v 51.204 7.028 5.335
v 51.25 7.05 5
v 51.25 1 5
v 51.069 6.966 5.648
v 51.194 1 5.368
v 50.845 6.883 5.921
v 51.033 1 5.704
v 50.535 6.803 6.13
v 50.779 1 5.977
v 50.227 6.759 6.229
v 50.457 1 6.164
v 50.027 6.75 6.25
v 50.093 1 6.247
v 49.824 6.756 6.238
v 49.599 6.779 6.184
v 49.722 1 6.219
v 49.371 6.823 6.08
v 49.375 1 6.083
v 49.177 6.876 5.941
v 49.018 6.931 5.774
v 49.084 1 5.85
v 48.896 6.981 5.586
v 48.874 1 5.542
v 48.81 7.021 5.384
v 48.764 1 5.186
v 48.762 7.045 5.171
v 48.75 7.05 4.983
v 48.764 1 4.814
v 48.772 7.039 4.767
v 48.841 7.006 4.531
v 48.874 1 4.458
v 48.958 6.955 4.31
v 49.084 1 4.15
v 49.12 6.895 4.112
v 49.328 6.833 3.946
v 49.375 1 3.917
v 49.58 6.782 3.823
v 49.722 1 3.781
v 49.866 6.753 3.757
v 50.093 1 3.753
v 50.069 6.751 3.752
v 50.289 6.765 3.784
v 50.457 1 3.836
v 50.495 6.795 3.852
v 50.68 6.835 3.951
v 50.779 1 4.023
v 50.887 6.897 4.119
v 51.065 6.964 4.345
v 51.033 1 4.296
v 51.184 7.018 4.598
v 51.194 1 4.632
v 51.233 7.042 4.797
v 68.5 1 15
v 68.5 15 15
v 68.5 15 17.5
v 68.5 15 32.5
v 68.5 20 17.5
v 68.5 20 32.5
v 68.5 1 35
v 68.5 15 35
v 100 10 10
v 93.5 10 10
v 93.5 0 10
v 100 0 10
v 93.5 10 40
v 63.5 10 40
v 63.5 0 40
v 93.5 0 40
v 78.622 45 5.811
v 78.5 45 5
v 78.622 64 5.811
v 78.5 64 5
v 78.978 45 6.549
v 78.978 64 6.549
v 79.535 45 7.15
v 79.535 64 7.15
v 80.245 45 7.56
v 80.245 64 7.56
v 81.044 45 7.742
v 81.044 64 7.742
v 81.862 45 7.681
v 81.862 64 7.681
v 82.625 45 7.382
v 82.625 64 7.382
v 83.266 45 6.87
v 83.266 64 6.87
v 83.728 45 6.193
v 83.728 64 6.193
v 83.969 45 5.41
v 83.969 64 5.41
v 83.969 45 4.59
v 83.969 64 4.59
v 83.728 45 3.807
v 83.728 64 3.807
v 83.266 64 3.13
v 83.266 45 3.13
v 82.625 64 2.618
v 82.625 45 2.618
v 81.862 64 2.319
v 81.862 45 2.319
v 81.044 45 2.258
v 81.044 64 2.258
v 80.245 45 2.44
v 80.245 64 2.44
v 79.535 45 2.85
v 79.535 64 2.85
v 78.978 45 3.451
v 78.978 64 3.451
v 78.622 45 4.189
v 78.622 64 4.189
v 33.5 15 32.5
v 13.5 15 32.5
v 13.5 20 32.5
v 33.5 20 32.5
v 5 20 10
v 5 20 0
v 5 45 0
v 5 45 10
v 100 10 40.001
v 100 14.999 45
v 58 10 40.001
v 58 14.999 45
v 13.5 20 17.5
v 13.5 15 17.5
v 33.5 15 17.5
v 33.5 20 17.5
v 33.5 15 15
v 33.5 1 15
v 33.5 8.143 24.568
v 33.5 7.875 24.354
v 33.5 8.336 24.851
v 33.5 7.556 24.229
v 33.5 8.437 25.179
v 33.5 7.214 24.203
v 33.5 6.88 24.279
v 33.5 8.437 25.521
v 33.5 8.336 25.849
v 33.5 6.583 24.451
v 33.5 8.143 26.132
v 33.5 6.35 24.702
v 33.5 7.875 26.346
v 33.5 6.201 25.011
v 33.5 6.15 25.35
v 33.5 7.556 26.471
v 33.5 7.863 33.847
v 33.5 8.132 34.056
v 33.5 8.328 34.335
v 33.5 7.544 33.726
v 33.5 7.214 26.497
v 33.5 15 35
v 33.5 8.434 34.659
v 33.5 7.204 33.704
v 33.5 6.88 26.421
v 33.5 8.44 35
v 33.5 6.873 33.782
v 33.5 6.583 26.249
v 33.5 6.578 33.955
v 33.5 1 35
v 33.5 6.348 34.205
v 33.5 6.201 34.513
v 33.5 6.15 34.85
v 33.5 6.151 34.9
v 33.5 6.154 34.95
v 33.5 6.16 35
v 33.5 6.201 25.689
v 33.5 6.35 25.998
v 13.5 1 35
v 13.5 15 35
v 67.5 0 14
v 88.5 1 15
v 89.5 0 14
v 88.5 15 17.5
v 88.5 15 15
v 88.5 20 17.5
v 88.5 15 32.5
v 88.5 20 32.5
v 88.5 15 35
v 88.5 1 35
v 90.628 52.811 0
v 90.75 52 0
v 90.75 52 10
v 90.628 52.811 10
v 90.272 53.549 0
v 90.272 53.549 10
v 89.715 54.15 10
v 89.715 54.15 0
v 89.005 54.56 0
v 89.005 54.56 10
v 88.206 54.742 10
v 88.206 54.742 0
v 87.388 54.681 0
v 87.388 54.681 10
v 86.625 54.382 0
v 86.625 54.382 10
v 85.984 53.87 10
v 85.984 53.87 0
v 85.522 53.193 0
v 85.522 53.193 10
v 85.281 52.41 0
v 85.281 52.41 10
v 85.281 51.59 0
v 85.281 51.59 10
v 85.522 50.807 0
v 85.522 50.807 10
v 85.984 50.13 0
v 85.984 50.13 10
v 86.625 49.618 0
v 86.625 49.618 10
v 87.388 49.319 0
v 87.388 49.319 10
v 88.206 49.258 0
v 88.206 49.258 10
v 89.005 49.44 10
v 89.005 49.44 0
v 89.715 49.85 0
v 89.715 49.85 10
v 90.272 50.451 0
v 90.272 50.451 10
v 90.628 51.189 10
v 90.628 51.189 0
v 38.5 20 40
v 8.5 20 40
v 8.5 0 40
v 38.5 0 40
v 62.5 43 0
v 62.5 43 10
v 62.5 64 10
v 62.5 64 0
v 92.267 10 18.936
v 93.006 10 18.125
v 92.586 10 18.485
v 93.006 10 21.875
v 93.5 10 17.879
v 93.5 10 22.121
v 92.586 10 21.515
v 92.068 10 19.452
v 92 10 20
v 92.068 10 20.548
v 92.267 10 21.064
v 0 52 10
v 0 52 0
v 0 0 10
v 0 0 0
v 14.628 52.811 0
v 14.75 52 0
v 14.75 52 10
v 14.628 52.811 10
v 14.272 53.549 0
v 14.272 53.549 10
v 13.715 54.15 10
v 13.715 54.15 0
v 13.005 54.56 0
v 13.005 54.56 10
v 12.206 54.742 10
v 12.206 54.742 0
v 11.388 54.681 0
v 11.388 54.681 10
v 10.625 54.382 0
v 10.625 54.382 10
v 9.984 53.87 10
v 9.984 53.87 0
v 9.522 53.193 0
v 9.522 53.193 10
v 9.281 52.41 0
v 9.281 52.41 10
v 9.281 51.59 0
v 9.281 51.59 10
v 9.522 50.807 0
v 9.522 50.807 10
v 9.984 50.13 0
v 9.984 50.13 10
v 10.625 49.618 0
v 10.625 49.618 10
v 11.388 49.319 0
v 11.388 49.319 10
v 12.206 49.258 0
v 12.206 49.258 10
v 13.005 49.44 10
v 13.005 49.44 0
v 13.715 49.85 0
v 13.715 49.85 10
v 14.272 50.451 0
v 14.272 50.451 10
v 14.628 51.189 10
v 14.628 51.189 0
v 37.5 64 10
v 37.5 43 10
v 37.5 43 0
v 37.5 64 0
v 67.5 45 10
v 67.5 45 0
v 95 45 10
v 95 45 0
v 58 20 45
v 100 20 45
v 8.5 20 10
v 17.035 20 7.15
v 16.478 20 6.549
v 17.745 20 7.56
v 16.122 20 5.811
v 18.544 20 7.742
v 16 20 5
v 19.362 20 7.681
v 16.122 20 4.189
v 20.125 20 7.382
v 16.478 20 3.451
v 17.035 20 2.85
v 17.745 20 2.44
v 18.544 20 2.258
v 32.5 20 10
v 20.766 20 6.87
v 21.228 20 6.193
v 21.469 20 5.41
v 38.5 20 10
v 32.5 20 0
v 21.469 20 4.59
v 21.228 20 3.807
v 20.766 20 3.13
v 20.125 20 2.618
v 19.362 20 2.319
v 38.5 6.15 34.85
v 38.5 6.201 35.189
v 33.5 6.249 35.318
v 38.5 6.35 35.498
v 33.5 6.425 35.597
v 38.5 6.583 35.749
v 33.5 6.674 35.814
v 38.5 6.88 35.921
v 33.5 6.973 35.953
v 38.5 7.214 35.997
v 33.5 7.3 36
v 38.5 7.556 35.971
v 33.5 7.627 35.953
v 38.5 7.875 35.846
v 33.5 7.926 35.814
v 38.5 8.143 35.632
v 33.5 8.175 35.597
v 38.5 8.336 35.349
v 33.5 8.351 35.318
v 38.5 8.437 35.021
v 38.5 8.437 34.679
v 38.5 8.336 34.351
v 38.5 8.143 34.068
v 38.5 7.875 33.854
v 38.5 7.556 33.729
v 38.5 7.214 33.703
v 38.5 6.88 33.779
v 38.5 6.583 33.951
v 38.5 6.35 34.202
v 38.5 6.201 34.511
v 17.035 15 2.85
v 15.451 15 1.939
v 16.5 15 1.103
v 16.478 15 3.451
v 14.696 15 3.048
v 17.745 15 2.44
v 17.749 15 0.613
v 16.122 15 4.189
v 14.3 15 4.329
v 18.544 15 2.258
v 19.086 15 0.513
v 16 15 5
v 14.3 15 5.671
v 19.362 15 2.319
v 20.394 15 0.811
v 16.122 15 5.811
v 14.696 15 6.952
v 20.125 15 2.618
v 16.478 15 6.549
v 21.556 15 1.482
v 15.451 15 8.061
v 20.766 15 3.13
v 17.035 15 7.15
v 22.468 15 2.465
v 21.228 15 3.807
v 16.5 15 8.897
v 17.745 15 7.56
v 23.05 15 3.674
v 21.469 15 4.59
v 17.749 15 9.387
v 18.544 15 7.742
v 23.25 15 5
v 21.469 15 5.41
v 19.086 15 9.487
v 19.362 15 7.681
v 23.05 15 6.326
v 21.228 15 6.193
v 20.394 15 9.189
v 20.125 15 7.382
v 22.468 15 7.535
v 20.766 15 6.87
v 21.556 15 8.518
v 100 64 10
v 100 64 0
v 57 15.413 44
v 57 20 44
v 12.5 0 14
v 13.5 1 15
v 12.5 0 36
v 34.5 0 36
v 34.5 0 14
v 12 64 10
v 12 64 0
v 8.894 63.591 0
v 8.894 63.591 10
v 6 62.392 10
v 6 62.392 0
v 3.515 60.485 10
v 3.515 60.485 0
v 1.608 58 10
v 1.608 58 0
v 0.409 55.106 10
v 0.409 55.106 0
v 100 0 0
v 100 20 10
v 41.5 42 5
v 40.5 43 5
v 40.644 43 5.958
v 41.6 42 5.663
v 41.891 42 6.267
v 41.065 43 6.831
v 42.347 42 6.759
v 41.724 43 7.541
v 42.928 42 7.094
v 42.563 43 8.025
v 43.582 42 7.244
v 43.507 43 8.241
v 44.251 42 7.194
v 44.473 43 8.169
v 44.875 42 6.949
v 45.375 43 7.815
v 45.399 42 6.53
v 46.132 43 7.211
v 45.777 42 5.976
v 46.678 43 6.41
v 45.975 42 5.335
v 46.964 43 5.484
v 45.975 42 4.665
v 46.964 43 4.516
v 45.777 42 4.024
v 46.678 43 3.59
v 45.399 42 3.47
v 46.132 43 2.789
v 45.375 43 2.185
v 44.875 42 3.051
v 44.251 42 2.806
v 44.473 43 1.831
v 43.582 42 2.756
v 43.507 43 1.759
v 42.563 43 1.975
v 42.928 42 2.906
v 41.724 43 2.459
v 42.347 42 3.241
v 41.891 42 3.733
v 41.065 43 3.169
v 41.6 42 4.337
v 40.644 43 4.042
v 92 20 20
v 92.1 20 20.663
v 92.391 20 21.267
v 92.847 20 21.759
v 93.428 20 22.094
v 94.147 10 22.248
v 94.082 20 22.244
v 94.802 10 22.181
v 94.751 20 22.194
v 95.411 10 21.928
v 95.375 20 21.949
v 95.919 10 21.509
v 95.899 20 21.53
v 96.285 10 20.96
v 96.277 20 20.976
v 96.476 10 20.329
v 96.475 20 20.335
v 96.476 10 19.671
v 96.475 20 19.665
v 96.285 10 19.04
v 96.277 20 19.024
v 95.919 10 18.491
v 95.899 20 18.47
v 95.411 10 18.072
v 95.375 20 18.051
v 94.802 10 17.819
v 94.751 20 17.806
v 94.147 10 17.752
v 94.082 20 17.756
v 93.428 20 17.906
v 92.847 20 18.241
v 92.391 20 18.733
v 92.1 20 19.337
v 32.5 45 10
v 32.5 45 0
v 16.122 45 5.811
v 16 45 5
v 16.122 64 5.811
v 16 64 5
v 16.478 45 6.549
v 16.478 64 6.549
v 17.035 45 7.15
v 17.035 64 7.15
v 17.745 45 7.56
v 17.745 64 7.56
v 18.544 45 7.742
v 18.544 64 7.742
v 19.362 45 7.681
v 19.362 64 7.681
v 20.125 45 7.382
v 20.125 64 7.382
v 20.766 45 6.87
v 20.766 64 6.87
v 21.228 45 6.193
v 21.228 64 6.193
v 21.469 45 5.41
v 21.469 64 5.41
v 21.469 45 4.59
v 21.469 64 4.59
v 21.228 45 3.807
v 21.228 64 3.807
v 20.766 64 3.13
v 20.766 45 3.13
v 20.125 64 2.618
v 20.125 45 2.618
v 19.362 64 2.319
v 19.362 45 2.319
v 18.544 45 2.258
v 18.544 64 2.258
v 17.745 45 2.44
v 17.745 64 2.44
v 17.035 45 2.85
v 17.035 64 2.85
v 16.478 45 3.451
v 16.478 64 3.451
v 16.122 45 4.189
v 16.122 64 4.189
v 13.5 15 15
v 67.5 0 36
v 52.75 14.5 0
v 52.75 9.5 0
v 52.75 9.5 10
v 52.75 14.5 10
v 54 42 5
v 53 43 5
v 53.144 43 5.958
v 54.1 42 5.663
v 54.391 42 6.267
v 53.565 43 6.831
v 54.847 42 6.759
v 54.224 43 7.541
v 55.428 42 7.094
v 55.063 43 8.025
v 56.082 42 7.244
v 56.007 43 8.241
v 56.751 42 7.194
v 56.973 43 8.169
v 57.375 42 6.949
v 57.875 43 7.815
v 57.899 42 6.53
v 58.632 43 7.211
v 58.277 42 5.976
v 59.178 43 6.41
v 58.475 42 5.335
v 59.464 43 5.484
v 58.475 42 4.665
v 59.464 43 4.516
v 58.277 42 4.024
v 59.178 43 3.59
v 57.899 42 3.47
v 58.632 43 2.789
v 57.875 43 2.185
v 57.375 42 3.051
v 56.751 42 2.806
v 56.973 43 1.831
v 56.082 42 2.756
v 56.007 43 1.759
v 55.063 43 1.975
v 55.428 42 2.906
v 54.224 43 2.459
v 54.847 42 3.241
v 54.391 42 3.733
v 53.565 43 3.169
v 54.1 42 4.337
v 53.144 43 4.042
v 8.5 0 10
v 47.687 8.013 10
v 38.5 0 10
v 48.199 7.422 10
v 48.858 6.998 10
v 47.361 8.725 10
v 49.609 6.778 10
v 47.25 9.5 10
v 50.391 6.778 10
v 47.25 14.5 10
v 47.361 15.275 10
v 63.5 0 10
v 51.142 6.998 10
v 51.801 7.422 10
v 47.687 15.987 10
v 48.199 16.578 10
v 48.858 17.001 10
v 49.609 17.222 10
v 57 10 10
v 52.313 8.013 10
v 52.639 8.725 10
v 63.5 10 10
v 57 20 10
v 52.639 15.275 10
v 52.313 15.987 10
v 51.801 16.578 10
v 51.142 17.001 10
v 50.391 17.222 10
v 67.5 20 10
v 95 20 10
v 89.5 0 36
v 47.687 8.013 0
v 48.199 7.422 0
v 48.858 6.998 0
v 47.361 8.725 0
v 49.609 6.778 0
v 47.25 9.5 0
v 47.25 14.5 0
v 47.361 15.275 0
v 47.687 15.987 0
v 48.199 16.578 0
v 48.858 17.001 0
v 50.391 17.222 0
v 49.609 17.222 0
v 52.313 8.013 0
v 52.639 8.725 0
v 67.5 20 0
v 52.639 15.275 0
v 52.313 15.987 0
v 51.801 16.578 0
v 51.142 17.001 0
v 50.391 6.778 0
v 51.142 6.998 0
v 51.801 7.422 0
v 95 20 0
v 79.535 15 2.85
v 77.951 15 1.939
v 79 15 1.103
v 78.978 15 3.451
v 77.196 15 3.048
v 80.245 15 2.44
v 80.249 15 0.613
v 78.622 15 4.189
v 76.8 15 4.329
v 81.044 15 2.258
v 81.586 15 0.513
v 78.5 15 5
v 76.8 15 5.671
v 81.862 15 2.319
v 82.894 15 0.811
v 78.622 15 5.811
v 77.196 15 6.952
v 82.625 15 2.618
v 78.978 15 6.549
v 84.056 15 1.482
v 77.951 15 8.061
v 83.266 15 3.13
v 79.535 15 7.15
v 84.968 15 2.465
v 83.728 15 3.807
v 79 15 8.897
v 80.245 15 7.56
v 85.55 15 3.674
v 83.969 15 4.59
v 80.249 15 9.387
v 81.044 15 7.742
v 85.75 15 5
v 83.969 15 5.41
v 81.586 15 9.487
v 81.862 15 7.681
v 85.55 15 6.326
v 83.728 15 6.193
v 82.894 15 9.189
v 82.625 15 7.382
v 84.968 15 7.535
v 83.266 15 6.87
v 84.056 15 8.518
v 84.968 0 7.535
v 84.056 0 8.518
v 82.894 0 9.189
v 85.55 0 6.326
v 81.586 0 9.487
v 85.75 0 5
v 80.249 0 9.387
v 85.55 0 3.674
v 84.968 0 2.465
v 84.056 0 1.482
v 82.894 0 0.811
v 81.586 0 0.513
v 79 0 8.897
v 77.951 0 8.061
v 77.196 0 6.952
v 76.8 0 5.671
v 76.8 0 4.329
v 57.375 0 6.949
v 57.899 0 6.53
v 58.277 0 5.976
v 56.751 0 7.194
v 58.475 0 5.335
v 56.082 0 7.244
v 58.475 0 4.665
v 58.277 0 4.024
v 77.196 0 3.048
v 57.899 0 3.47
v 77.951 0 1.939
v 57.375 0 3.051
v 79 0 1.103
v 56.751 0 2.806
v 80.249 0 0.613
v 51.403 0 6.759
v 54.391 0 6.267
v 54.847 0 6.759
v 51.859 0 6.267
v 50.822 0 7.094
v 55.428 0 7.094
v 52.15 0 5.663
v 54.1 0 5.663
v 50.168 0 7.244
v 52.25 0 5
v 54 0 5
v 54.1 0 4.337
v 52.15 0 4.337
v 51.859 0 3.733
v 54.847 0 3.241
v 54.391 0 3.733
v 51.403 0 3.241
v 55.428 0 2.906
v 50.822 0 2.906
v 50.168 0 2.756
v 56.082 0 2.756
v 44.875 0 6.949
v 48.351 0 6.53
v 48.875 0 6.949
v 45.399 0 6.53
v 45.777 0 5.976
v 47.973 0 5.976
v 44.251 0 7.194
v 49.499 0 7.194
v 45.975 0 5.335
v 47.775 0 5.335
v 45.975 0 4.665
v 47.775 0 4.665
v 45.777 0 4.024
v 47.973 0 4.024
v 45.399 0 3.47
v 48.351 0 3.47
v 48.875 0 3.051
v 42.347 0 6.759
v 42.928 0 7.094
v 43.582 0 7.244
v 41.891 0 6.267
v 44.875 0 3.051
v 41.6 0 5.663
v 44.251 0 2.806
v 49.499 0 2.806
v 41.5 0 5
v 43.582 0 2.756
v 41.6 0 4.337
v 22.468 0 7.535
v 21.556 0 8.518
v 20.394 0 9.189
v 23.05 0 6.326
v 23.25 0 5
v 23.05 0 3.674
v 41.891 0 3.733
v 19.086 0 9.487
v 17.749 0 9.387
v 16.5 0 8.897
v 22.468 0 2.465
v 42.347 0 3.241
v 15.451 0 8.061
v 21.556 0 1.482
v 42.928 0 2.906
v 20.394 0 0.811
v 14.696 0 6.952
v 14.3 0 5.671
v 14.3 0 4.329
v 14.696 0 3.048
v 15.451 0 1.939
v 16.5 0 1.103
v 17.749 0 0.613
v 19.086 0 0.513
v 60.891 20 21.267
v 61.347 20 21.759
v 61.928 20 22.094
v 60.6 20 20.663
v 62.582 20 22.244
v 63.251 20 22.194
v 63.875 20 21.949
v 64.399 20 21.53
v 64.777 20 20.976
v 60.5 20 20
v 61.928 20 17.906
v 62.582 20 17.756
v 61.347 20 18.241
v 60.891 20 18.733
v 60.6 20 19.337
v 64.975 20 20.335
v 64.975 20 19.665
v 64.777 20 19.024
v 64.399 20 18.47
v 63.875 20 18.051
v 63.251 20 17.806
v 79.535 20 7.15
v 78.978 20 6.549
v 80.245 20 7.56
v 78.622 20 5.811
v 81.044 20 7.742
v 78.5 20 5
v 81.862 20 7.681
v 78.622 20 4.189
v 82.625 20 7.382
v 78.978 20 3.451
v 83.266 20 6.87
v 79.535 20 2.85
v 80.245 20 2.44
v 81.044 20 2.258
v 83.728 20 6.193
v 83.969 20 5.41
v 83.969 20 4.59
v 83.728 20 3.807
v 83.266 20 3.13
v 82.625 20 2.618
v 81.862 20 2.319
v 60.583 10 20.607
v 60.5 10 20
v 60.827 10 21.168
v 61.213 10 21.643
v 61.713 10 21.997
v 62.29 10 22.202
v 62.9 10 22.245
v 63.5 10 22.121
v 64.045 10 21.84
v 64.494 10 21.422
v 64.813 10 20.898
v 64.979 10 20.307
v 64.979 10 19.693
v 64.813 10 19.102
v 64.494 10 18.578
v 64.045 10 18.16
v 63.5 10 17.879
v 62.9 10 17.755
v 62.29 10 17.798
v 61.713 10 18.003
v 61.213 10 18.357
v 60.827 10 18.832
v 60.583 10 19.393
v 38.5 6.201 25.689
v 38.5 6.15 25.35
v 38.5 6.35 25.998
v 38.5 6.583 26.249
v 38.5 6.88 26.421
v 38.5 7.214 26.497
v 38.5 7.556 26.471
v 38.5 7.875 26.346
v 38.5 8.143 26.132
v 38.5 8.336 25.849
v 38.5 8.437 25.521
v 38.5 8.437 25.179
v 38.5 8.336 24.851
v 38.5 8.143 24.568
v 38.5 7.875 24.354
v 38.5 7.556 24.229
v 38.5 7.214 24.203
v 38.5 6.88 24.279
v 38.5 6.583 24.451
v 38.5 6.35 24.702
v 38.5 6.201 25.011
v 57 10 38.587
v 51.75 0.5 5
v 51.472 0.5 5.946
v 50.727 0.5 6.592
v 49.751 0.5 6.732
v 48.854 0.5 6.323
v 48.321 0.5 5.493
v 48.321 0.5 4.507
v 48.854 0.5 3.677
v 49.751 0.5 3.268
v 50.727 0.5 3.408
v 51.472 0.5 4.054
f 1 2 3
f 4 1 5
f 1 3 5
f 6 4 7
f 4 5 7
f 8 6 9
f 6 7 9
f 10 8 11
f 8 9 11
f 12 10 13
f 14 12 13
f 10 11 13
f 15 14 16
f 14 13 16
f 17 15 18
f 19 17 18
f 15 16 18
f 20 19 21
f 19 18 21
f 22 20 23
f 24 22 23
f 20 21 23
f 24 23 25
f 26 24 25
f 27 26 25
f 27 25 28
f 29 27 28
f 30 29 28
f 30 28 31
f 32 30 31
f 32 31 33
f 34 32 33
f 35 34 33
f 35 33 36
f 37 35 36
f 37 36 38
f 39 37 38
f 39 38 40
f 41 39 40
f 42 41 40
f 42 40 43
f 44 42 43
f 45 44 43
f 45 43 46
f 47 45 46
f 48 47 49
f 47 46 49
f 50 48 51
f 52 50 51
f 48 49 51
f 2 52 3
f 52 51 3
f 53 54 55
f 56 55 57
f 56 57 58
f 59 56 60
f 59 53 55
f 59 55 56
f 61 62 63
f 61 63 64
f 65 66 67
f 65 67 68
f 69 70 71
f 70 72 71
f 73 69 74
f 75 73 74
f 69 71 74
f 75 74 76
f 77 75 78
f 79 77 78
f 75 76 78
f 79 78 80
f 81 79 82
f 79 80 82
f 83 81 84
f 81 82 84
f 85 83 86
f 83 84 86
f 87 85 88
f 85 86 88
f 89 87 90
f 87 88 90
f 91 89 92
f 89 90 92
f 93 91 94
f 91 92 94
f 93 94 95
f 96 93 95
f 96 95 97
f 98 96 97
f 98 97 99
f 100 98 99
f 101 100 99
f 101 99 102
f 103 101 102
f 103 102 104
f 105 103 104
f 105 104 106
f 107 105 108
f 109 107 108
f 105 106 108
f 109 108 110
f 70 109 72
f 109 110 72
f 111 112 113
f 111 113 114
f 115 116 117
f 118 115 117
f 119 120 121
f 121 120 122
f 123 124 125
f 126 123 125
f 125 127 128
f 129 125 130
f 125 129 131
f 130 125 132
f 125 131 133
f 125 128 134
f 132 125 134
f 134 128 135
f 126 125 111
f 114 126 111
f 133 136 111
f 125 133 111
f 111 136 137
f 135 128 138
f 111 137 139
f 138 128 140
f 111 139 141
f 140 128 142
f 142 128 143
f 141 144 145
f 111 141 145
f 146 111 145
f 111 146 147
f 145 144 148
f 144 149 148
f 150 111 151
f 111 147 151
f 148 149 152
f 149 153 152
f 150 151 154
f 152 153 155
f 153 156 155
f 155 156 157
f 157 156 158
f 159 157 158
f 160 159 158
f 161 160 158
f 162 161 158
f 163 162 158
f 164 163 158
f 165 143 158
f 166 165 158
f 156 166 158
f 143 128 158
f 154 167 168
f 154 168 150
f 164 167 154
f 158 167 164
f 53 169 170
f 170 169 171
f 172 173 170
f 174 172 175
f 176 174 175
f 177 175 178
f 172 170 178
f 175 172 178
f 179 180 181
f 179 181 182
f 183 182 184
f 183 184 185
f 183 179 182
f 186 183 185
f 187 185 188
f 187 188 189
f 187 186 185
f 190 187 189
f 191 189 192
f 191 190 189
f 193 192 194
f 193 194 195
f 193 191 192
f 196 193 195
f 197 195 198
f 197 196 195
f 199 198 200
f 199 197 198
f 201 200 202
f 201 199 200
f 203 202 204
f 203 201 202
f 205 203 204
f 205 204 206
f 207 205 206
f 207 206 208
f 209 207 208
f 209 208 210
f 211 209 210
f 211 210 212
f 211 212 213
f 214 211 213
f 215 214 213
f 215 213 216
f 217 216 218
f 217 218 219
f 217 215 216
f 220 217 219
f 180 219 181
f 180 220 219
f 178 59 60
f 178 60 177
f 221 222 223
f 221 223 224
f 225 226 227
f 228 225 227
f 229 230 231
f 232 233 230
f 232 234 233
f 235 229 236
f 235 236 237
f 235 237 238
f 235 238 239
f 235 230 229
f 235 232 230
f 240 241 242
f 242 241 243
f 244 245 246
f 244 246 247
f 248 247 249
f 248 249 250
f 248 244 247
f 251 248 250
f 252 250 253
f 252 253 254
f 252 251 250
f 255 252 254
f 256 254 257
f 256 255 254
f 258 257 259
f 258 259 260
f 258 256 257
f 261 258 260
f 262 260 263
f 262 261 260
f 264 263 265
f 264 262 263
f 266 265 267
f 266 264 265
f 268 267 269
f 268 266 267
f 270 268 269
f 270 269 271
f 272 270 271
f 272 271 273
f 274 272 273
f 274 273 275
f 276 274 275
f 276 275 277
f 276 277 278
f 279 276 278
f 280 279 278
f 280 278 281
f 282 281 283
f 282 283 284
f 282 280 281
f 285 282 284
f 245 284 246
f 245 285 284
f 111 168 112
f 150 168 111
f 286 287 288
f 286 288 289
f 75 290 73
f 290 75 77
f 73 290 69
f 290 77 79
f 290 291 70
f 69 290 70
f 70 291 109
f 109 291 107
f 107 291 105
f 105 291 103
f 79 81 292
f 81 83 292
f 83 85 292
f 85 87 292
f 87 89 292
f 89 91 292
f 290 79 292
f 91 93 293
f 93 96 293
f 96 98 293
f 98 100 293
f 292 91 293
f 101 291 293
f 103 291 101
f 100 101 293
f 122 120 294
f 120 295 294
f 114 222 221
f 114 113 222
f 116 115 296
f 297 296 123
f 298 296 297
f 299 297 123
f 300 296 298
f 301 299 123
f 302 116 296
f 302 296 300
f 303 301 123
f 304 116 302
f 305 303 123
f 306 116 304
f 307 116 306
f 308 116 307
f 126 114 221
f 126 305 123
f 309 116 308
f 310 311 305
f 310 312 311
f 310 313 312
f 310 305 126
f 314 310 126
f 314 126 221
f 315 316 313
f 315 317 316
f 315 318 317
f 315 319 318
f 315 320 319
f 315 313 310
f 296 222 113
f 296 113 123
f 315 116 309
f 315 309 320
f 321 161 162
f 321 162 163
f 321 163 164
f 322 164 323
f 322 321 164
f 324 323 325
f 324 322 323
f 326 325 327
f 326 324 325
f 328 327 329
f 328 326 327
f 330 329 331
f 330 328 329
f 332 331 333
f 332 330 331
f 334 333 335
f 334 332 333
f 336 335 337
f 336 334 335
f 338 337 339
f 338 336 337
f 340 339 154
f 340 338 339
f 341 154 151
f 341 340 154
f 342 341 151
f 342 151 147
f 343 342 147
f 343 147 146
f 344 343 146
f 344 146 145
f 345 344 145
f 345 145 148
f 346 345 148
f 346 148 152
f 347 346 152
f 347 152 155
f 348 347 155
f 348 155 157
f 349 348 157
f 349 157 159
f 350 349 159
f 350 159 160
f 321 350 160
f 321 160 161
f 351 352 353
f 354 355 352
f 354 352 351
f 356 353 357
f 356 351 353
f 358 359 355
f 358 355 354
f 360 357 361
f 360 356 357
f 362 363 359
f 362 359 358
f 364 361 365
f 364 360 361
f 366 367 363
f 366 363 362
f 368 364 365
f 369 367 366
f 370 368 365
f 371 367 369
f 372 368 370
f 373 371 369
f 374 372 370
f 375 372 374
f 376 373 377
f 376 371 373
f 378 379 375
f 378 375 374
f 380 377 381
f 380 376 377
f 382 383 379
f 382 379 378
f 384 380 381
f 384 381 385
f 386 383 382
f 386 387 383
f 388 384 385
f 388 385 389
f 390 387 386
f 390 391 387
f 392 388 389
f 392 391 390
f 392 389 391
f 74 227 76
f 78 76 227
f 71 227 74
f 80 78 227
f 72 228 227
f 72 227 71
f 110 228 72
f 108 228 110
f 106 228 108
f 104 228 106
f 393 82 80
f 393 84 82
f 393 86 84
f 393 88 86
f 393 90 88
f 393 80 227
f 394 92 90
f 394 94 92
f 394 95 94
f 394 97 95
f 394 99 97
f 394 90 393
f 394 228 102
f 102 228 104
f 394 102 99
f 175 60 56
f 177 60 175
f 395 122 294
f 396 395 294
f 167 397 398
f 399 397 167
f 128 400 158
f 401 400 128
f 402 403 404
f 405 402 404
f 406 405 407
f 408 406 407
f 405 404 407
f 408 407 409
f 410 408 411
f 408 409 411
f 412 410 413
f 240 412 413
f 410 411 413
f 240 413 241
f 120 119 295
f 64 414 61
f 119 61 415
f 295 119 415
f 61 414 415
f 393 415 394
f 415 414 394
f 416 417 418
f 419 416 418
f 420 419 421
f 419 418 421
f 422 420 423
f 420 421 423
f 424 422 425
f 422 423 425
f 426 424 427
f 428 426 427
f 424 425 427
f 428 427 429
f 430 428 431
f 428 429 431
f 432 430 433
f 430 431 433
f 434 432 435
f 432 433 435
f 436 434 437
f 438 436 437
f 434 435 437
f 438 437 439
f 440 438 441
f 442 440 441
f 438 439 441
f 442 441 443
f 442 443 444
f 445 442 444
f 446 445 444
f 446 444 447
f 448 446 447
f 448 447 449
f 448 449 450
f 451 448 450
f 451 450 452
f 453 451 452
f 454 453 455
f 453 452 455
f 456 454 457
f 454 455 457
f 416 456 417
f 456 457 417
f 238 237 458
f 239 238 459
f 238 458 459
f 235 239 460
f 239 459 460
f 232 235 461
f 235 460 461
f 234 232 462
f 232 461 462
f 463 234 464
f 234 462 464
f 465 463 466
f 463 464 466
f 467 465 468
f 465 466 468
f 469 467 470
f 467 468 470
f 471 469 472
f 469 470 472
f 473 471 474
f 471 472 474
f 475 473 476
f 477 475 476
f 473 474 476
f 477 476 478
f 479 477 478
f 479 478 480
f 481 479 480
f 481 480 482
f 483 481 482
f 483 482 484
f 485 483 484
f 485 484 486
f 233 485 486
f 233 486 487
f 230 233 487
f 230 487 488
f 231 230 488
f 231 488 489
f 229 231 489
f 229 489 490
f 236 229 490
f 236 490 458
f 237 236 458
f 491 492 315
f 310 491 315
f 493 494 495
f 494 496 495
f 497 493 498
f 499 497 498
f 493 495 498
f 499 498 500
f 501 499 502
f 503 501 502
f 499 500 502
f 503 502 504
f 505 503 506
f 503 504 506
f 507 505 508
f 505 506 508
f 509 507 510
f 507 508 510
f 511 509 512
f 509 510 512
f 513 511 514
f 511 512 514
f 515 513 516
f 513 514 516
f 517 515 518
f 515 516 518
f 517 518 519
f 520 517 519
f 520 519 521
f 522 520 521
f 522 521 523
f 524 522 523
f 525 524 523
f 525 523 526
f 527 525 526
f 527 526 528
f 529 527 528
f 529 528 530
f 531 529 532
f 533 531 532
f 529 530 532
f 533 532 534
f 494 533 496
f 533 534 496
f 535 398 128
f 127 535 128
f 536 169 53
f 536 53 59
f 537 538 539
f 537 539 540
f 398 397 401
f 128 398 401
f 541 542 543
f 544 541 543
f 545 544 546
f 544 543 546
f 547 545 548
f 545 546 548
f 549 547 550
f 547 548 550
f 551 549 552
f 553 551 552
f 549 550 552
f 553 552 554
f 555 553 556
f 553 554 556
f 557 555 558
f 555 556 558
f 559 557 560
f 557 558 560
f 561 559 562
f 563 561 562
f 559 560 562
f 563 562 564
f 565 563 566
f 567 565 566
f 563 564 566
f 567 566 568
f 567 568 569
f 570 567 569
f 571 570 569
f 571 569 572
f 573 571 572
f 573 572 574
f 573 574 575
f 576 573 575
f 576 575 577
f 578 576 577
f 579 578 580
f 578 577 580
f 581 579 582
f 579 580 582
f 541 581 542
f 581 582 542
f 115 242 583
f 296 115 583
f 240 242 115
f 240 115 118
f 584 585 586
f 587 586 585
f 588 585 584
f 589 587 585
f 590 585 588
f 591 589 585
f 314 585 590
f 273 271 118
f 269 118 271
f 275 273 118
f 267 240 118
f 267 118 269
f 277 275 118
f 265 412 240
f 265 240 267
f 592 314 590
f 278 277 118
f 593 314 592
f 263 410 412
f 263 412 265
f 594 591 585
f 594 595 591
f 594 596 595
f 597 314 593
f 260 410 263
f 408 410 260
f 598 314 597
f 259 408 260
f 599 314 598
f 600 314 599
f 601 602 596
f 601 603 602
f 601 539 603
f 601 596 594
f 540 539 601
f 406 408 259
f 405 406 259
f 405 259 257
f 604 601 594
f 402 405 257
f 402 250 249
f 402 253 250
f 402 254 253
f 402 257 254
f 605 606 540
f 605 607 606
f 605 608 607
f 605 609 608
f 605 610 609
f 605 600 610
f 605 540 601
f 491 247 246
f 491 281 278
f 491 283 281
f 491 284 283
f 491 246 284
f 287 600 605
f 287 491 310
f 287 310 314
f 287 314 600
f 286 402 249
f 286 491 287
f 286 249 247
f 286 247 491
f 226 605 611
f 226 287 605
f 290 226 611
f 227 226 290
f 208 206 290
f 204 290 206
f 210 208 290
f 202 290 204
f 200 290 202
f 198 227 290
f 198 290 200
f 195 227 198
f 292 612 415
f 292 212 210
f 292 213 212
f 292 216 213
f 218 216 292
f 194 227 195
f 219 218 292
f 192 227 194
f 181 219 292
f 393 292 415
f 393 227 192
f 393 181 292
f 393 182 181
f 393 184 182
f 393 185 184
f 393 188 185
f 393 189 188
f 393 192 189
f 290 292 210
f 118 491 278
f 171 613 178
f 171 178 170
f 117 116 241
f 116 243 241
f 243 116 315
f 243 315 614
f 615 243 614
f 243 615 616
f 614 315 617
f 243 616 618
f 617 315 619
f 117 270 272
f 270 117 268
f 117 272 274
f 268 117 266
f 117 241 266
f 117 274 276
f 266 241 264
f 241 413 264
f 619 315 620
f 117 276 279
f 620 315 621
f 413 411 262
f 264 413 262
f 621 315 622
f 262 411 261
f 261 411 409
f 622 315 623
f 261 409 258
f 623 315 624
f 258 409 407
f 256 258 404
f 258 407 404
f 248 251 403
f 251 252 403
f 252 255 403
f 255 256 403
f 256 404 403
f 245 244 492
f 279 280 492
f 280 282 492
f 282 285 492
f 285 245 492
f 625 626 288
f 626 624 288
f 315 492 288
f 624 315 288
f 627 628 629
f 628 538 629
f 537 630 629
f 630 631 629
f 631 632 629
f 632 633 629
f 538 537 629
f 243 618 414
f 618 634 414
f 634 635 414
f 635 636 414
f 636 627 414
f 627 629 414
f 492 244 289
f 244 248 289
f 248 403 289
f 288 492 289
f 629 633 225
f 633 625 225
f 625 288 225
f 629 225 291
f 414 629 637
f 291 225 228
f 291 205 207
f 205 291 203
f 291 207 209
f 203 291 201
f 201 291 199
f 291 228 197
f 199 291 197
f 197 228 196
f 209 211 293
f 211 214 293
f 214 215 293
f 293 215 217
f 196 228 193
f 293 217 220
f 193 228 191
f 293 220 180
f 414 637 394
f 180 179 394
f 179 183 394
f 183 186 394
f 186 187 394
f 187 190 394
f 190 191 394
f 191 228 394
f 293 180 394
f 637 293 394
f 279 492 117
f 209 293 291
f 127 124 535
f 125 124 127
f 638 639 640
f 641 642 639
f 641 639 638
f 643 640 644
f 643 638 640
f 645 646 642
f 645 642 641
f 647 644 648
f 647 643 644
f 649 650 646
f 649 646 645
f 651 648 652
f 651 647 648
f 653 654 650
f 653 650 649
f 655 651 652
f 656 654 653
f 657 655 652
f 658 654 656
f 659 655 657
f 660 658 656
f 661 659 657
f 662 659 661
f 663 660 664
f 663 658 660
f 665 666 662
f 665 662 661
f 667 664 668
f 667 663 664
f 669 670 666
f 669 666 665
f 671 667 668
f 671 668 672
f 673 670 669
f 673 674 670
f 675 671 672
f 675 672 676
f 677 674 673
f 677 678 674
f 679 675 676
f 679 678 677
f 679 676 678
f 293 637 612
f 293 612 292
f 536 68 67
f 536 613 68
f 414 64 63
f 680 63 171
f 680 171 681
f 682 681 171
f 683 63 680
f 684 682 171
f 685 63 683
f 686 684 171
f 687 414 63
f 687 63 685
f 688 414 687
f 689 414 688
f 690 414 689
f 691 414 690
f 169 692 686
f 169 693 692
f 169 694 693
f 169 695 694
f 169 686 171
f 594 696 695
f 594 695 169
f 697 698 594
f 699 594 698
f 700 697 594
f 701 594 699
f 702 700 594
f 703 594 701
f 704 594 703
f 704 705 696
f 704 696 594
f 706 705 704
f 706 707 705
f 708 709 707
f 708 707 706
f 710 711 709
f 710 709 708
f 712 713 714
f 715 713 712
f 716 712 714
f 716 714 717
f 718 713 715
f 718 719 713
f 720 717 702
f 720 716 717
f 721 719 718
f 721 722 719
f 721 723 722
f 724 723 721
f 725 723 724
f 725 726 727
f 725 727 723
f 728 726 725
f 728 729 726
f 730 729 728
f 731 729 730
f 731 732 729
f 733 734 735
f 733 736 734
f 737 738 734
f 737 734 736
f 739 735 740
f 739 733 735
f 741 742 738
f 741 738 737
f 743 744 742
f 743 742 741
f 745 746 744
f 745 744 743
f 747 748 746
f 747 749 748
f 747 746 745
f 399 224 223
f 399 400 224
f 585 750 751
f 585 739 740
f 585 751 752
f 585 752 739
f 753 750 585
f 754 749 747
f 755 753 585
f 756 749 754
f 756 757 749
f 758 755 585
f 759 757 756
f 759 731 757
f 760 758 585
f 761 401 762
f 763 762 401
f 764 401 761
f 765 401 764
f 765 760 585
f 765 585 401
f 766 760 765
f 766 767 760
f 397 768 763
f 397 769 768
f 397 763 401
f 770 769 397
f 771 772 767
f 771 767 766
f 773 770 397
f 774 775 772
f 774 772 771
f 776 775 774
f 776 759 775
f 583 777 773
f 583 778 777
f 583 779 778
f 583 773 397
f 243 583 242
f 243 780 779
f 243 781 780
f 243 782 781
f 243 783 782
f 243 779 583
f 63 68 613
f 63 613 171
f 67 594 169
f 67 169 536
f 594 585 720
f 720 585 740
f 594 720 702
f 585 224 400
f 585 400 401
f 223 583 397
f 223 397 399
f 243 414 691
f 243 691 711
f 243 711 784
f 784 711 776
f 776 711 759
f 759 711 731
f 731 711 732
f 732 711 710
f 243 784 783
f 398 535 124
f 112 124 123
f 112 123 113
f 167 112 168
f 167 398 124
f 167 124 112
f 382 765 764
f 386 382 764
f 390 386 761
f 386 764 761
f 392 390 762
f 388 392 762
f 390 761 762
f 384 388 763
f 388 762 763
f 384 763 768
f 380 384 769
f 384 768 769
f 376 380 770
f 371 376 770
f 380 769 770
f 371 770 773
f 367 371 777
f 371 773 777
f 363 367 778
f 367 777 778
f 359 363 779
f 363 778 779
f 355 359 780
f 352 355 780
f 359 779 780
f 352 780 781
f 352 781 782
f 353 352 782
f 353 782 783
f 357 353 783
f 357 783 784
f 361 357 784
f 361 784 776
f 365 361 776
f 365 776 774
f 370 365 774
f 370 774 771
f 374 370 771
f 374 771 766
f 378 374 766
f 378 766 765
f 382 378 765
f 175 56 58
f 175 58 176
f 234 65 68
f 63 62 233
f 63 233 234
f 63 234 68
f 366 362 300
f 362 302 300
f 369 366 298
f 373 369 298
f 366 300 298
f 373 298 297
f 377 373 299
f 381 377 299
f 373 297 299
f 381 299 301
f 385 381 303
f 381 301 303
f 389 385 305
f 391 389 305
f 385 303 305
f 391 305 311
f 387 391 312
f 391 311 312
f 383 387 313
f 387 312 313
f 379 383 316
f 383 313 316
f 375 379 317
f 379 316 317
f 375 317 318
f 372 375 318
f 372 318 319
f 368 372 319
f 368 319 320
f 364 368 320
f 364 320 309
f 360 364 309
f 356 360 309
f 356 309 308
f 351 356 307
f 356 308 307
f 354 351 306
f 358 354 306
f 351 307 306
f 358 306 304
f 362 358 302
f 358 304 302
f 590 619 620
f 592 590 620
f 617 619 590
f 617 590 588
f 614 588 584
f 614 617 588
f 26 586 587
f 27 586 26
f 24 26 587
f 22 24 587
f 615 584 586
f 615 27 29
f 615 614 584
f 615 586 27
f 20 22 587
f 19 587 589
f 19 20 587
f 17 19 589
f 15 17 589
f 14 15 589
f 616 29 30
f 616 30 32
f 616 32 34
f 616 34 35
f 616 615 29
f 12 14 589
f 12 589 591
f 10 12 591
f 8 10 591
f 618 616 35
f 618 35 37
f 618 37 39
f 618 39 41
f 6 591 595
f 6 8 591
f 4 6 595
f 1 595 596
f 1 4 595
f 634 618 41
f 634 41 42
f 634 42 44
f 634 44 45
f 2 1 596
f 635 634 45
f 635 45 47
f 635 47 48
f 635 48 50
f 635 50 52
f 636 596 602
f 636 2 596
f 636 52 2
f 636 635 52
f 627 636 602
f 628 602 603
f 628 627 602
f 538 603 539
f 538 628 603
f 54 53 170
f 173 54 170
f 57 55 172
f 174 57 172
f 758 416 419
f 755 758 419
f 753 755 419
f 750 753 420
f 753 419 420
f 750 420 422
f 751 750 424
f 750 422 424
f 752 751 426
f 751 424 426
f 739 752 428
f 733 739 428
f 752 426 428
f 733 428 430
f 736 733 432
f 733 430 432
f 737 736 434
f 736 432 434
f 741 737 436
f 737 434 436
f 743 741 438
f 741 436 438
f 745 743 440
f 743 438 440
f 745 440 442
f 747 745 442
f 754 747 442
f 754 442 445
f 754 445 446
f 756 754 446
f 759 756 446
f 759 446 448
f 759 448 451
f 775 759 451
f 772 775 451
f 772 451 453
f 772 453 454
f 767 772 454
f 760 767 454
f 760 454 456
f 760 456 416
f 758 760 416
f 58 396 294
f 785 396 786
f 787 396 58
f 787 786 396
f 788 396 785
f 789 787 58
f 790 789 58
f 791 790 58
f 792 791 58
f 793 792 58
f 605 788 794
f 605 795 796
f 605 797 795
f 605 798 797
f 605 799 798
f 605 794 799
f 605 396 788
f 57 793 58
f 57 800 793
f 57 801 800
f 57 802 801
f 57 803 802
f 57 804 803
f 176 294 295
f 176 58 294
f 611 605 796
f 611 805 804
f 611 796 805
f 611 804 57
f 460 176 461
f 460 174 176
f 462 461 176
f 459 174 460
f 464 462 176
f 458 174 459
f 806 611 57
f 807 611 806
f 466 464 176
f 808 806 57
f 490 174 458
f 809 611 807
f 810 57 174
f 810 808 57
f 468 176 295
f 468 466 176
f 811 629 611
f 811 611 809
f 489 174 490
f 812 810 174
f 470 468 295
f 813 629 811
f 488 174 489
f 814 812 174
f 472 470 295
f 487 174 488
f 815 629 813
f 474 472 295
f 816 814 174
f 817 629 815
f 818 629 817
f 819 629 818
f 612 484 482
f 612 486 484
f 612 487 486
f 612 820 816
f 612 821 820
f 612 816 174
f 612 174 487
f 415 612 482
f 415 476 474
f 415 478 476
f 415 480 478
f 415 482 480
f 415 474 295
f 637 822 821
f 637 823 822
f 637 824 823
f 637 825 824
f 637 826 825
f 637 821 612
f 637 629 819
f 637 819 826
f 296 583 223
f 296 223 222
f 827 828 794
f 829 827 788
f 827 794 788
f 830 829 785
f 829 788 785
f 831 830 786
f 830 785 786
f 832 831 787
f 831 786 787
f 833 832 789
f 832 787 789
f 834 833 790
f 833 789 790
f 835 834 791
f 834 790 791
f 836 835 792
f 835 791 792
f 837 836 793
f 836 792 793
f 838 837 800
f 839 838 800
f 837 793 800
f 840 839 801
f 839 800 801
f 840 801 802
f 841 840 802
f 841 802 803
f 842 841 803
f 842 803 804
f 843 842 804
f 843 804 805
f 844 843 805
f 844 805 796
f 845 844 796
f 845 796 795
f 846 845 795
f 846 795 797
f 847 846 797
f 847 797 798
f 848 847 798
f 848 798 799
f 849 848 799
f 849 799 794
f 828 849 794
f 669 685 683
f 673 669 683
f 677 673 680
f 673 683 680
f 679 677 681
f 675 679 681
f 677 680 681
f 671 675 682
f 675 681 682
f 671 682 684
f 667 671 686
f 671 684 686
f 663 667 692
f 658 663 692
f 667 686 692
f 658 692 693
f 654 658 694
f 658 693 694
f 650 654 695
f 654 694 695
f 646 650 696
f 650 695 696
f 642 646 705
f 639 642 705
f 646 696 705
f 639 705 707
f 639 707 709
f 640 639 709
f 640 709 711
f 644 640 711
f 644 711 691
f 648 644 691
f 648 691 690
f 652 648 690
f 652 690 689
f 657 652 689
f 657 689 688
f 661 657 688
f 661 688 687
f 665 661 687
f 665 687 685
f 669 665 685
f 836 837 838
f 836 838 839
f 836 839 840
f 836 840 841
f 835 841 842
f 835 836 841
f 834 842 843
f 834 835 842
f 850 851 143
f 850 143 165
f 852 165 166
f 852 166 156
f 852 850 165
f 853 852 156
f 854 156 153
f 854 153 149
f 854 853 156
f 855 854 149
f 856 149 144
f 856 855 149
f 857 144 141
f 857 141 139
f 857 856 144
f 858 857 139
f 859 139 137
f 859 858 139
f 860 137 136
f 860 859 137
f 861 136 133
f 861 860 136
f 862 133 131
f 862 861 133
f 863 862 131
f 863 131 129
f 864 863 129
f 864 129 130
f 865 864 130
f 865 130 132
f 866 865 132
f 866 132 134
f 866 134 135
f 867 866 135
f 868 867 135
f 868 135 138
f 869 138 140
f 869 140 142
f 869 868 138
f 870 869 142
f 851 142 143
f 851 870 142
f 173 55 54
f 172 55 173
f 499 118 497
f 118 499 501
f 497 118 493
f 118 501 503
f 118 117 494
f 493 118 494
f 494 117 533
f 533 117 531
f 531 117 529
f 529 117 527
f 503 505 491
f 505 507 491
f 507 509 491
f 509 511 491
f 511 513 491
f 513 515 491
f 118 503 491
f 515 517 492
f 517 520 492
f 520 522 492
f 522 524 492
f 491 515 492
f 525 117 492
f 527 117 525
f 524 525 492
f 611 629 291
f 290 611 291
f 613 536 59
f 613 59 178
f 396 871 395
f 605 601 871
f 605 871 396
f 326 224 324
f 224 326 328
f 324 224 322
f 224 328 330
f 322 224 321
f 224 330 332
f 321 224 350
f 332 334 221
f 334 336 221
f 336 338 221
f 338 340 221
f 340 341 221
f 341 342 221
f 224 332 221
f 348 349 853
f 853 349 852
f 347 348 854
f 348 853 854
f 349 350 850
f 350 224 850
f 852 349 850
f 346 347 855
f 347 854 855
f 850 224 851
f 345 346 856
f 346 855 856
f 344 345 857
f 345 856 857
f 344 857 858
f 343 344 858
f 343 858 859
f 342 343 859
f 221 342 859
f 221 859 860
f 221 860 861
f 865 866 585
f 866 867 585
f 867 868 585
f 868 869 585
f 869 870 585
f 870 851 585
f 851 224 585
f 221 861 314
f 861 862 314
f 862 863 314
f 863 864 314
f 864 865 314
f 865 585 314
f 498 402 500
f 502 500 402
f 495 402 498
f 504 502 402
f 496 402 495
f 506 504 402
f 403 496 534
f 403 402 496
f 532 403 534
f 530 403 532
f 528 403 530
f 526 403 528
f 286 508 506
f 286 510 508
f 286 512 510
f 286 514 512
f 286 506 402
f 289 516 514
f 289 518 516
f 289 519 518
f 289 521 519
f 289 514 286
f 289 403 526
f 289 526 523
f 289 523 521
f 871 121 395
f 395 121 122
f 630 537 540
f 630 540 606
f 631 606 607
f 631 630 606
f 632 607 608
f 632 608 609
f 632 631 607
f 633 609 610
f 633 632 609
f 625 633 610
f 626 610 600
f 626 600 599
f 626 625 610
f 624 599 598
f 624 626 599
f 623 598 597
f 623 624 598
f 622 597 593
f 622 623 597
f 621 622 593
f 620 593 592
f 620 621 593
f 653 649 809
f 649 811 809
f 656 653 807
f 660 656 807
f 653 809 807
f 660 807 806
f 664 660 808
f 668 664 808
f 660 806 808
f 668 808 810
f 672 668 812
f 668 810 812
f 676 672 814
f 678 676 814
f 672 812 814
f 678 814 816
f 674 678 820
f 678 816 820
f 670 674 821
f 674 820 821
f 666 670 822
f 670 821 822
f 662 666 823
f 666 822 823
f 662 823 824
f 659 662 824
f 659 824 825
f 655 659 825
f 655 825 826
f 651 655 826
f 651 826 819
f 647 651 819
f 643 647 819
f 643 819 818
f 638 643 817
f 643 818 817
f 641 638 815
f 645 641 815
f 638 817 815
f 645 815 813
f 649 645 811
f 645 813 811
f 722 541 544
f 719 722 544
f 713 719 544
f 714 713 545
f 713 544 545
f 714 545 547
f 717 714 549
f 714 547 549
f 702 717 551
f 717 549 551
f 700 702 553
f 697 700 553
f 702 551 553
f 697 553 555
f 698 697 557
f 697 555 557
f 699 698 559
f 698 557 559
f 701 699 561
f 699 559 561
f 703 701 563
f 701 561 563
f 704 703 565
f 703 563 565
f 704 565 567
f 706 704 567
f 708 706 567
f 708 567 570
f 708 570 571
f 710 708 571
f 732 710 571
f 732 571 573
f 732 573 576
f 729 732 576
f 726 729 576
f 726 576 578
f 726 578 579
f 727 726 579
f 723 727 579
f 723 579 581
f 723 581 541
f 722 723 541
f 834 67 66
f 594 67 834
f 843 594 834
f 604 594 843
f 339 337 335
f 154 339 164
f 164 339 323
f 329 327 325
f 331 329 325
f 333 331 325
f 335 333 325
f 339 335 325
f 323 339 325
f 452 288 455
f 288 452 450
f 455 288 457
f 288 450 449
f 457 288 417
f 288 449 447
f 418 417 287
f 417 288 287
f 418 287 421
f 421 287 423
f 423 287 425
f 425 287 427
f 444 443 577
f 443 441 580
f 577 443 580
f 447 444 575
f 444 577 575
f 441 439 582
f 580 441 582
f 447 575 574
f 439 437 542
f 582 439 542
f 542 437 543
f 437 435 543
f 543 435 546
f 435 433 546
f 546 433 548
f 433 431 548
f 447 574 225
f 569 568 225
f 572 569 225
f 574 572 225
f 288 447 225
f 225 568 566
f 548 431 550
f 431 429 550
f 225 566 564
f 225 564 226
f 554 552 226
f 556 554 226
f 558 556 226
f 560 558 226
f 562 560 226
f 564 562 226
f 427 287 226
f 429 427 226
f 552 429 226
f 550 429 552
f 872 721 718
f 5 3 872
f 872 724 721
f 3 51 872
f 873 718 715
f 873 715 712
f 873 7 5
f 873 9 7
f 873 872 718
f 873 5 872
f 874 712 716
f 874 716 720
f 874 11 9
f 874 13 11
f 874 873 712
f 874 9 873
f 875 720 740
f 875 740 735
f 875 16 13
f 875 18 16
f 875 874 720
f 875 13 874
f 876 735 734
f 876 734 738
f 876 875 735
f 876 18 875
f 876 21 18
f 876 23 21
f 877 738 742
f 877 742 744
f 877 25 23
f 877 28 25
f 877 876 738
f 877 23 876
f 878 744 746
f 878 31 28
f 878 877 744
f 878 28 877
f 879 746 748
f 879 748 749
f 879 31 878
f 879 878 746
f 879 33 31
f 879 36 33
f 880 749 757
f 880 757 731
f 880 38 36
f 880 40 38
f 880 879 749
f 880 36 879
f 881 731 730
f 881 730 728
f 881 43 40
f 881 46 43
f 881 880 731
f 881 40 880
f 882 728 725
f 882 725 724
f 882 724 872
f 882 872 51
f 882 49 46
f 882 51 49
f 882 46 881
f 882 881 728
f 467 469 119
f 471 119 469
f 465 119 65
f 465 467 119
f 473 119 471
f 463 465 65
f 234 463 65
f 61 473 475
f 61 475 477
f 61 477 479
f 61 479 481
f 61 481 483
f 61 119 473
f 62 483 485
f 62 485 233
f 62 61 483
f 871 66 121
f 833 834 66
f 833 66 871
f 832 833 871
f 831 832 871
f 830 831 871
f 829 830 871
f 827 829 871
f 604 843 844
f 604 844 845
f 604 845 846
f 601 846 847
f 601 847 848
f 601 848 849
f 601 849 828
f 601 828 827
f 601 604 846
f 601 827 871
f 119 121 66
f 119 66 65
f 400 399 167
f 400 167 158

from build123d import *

# Parameters (mm, degrees)
SKETCH_R         = 2.75
SKETCH_W         = 27.5
SKETCH_H         = 25
PAD_DEPTH        = 10
SKETCH001_W      = 30
SKETCH001_H      = 20
PAD001_DEPTH     = 30
PAD002_DEPTH     = 35
SKETCH003_W      = 20
SKETCH003_H      = 20
POCKET_DEPTH     = 15
SKETCH004_W      = 20
SKETCH004_H      = 15
POCKET001_DEPTH  = 64.000985
HOLE_D           = 5.5
HOLE_CBORE_D     = 9
HOLE_CBORE_DEPTH = 15
POCKET003_DEPTH  = 10.001
SKETCH011_W      = 30
SKETCH011_H      = 10
POCKET004_DEPTH  = 5
CHAMFER_SIZE     = 4.999
SKETCH012_R      = 2.25
HOLE001_DEPTH    = 10
SKETCH013_W      = 25
SKETCH013_H      = 21
POCKET005_DEPTH  = 10.001
SKETCH014_R      = 2.25
HOLE002_DEPTH    = 43.000985
SKETCH015_R      = 1.15
POCKET006_DEPTH  = 5
PAD003_DEPTH     = 10
CHAMFER001_SIZE  = 1
SKETCH017_R      = 1.25
HOLE003_DEPTH    = 10
HOLE003_TIPS_R   = 1.25
CHAMFER002_SIZE  = 1


with BuildPart() as part:
    # Sketch → Pad (new body)
    with BuildSketch(Plane.XY):
        with BuildLine():
            Line((100, 0), (100, 51.999985))
            ThreePointArc((100, 51.999985), (96.485281, 60.485267), (88, 63.999985))
            Line((12, 63.999985), (88, 63.999985))
            ThreePointArc((12, 63.999985), (3.514719, 60.485267), (0, 51.999985))
            Line((0, 51.999985), (0, 0))
            Line((0, 0), (100, 0))
        make_face()
        with Locations((12, 51.999985)):
            Circle(SKETCH_R, mode=Mode.SUBTRACT)
        with Locations((88, 51.999985)):
            Circle(SKETCH_R, mode=Mode.SUBTRACT)
        Polygon((32.5, 45), (32.5, 20), (5, 20), (5, 45), (18.75, 45), align=None, mode=Mode.SUBTRACT)
        with Locations((81.25, 32.5)):
            Rectangle(SKETCH_W, SKETCH_H, mode=Mode.SUBTRACT)
        with BuildLine():
            ThreePointArc((47.25, 9.499985), (50, 6.749985), (52.75, 9.499985))
            Line((52.75, 9.499985), (52.75, 14.499985))
            ThreePointArc((52.75, 14.499985), (50, 17.249985), (47.25, 14.499985))
            Line((47.25, 9.499985), (47.25, 14.499985))
        make_face(mode=Mode.SUBTRACT)
    extrude(amount=PAD_DEPTH)

    # Sketch001 (on Face23 of Pad) → Pad001 (join)
    with BuildSketch(Plane.XY.offset(10)):
        with Locations((23.5, 10)):
            Rectangle(SKETCH001_W, SKETCH001_H)
    extrude(amount=PAD001_DEPTH)

    # Sketch002 (on Face5 of Pad001) → Pad002 (join)
    with BuildSketch(Plane.XY.offset(10)):
        Polygon((63.5, 10), (57, 10), (57, 20), (100, 20), (100, 10), (93.5, 10), (93.5, 0), (63.5, 0), align=None)
    extrude(amount=PAD002_DEPTH)

    # Sketch003 (on Face9 of Pad002) → Pocket (cut)
    with BuildSketch(Plane.XZ):
        with Locations((23.5, 25)):
            Rectangle(SKETCH003_W, SKETCH003_H)
        with Locations((78.5, 25)):
            Rectangle(SKETCH003_W, SKETCH003_H)
    extrude(amount=-POCKET_DEPTH, mode=Mode.SUBTRACT)

    # Sketch004 (on Face9 of Pocket) → Pocket001 (cut, through all)
    with BuildSketch(Plane.XZ):
        with Locations((23.5, 25)):
            Rectangle(SKETCH004_W, SKETCH004_H)
        with Locations((78.5, 25)):
            Rectangle(SKETCH004_W, SKETCH004_H)
    extrude(amount=-POCKET001_DEPTH, mode=Mode.SUBTRACT)

    # Hole (through all)
    with Locations(Plane.XZ):
        with Locations((81.25, 5), (18.75, 5)):
            CounterBoreHole(HOLE_D / 2, HOLE_CBORE_D / 2, HOLE_CBORE_DEPTH)

    # Sketch010 → Pocket003 (cut, through all)
    with BuildSketch(Plane.XY.offset(10)):
        with BuildLine():
            ThreePointArc((47.748891, 59.001218), (44.998891, 61.751218), (42.248891, 59.001218))
            Line((42.248891, 59.001218), (42.248891, 54.001218))
            ThreePointArc((42.248891, 54.001218), (44.998891, 51.251218), (47.748891, 54.001218))
            Line((47.748891, 59.001218), (47.748891, 54.001218))
        make_face()
        with BuildLine():
            ThreePointArc((57.748891, 59.001218), (54.998891, 61.751218), (52.248891, 59.001218))
            Line((52.248891, 59.001218), (52.248891, 54.001218))
            ThreePointArc((52.248891, 54.001218), (54.998891, 51.251218), (57.748891, 54.001218))
            Line((57.748891, 59.001218), (57.748891, 54.001218))
        make_face()
    extrude(amount=-POCKET003_DEPTH, mode=Mode.SUBTRACT)

    # Sketch011 (on Face41 of Pocket003) → Pocket004 (cut)
    with BuildSketch(Plane.XY.offset(45)):
        with Locations((78.5, 5)):
            Rectangle(SKETCH011_W, SKETCH011_H)
    extrude(amount=-POCKET004_DEPTH, mode=Mode.SUBTRACT)

    # Chamfer
    chamfer_edges = [part.edges().sort_by_distance(p)[0] for p in [
        (60.25, 10, 45),
        (78.5, 10, 45),
        (96.75, 10, 45),
    ]]
    chamfer(chamfer_edges, length=CHAMFER_SIZE)

    # Sketch012 (on Face6 of Chamfer) → Hole001 (cut)
    with BuildSketch(Plane(origin=(0, 20, 0), x_dir=(-1, 0, 0), z_dir=(0, 1, 0))):
        with Locations((-94.25, 20)):
            Circle(SKETCH012_R)
        with Locations((-62.75, 20)):
            Circle(SKETCH012_R)
    extrude(amount=-HOLE001_DEPTH, mode=Mode.SUBTRACT)

    # Sketch013 (on Face15 of Hole001) → Pocket005 (cut, through all)
    with BuildSketch(Plane.XY.offset(10)):
        with Locations((50, 53.499985)):
            Rectangle(SKETCH013_W, SKETCH013_H)
    extrude(amount=-POCKET005_DEPTH, mode=Mode.SUBTRACT)

    # Sketch014 (on Face36 of Pocket005) → Hole002 (cut, through all)
    with BuildSketch(Plane(origin=(0, 42.999985, 0), x_dir=(-1, 0, 0), z_dir=(0, 1, 0))):
        with Locations((-56.25, 5)):
            Circle(SKETCH014_R)
        with Locations((-43.75, 5)):
            Circle(SKETCH014_R)
    extrude(amount=-HOLE002_DEPTH, mode=Mode.SUBTRACT)

    # Sketch015 (on Face55 of Hole002) → Pocket006 (cut)
    with BuildSketch(Plane(origin=(38.5, 0, 0), x_dir=(0, -1, 0), z_dir=(-1, 0, 0))):
        with Locations((-7.3, 34.85)):
            Circle(SKETCH015_R)
        with Locations((-7.3, 25.35)):
            Circle(SKETCH015_R)
    extrude(amount=POCKET006_DEPTH, mode=Mode.SUBTRACT)

    # Sketch016 (on Face15 of Pocket006) → Pad003 (join)
    with BuildSketch(Plane.XY.offset(10)):
        Polygon((100, 51.999985), (88, 63.999985), (100, 63.999985), align=None)
    extrude(amount=-PAD003_DEPTH)

    # Chamfer001
    chamfer001_edges = [part.edges().sort_by_distance(p)[0] for p in [
        (13.5, 0, 25),
        (13.5, 0, 33.75),
        (23.5, 0, 35),
        (13.5, 0, 16.25),
        (23.5, 0, 15),
        (33.5, 0, 25),
        (33.5, 0, 33.75),
        (33.5, 0, 16.25),
        (68.5, 0, 25),
        (68.5, 0, 16.25),
        (68.5, 0, 33.75),
        (78.5, 0, 35),
        (88.5, 0, 33.75),
        (88.5, 0, 25),
        (88.5, 0, 16.25),
        (78.5, 0, 15),
    ]]
    chamfer(chamfer001_edges, length=CHAMFER001_SIZE)

    # Sketch017 (on Face10 of Chamfer001) → Hole003 (cut)
    with BuildSketch(Plane.XZ):
        with Locations((50, 5)):
            Circle(SKETCH017_R)
    extrude(amount=-HOLE003_DEPTH, mode=Mode.SUBTRACT)

    # Hole003 tips → Hole003 tip 1 section 0
    with BuildSketch(Plane.XZ.offset(-10), mode=Mode.PRIVATE) as hole003_tip_1_s0:
        with Locations((50, 5)):
            Circle(HOLE003_TIPS_R)
    loft([hole003_tip_1_s0.sketch, Vertex(50, 10.751076, 5)], mode=Mode.SUBTRACT)

    # Chamfer002
    chamfer002_edges = [part.edges().sort_by_distance(p)[0] for p in [
        (51.25, 0, 5),
        (57, 17.4995, 45),
        (41.5, 42.999985, 5),
        (54, 42.999985, 5),
        (57, 12.4995, 42.5005),
    ]]
    chamfer(chamfer002_edges, length=CHAMFER002_SIZE)


solid = part.part
